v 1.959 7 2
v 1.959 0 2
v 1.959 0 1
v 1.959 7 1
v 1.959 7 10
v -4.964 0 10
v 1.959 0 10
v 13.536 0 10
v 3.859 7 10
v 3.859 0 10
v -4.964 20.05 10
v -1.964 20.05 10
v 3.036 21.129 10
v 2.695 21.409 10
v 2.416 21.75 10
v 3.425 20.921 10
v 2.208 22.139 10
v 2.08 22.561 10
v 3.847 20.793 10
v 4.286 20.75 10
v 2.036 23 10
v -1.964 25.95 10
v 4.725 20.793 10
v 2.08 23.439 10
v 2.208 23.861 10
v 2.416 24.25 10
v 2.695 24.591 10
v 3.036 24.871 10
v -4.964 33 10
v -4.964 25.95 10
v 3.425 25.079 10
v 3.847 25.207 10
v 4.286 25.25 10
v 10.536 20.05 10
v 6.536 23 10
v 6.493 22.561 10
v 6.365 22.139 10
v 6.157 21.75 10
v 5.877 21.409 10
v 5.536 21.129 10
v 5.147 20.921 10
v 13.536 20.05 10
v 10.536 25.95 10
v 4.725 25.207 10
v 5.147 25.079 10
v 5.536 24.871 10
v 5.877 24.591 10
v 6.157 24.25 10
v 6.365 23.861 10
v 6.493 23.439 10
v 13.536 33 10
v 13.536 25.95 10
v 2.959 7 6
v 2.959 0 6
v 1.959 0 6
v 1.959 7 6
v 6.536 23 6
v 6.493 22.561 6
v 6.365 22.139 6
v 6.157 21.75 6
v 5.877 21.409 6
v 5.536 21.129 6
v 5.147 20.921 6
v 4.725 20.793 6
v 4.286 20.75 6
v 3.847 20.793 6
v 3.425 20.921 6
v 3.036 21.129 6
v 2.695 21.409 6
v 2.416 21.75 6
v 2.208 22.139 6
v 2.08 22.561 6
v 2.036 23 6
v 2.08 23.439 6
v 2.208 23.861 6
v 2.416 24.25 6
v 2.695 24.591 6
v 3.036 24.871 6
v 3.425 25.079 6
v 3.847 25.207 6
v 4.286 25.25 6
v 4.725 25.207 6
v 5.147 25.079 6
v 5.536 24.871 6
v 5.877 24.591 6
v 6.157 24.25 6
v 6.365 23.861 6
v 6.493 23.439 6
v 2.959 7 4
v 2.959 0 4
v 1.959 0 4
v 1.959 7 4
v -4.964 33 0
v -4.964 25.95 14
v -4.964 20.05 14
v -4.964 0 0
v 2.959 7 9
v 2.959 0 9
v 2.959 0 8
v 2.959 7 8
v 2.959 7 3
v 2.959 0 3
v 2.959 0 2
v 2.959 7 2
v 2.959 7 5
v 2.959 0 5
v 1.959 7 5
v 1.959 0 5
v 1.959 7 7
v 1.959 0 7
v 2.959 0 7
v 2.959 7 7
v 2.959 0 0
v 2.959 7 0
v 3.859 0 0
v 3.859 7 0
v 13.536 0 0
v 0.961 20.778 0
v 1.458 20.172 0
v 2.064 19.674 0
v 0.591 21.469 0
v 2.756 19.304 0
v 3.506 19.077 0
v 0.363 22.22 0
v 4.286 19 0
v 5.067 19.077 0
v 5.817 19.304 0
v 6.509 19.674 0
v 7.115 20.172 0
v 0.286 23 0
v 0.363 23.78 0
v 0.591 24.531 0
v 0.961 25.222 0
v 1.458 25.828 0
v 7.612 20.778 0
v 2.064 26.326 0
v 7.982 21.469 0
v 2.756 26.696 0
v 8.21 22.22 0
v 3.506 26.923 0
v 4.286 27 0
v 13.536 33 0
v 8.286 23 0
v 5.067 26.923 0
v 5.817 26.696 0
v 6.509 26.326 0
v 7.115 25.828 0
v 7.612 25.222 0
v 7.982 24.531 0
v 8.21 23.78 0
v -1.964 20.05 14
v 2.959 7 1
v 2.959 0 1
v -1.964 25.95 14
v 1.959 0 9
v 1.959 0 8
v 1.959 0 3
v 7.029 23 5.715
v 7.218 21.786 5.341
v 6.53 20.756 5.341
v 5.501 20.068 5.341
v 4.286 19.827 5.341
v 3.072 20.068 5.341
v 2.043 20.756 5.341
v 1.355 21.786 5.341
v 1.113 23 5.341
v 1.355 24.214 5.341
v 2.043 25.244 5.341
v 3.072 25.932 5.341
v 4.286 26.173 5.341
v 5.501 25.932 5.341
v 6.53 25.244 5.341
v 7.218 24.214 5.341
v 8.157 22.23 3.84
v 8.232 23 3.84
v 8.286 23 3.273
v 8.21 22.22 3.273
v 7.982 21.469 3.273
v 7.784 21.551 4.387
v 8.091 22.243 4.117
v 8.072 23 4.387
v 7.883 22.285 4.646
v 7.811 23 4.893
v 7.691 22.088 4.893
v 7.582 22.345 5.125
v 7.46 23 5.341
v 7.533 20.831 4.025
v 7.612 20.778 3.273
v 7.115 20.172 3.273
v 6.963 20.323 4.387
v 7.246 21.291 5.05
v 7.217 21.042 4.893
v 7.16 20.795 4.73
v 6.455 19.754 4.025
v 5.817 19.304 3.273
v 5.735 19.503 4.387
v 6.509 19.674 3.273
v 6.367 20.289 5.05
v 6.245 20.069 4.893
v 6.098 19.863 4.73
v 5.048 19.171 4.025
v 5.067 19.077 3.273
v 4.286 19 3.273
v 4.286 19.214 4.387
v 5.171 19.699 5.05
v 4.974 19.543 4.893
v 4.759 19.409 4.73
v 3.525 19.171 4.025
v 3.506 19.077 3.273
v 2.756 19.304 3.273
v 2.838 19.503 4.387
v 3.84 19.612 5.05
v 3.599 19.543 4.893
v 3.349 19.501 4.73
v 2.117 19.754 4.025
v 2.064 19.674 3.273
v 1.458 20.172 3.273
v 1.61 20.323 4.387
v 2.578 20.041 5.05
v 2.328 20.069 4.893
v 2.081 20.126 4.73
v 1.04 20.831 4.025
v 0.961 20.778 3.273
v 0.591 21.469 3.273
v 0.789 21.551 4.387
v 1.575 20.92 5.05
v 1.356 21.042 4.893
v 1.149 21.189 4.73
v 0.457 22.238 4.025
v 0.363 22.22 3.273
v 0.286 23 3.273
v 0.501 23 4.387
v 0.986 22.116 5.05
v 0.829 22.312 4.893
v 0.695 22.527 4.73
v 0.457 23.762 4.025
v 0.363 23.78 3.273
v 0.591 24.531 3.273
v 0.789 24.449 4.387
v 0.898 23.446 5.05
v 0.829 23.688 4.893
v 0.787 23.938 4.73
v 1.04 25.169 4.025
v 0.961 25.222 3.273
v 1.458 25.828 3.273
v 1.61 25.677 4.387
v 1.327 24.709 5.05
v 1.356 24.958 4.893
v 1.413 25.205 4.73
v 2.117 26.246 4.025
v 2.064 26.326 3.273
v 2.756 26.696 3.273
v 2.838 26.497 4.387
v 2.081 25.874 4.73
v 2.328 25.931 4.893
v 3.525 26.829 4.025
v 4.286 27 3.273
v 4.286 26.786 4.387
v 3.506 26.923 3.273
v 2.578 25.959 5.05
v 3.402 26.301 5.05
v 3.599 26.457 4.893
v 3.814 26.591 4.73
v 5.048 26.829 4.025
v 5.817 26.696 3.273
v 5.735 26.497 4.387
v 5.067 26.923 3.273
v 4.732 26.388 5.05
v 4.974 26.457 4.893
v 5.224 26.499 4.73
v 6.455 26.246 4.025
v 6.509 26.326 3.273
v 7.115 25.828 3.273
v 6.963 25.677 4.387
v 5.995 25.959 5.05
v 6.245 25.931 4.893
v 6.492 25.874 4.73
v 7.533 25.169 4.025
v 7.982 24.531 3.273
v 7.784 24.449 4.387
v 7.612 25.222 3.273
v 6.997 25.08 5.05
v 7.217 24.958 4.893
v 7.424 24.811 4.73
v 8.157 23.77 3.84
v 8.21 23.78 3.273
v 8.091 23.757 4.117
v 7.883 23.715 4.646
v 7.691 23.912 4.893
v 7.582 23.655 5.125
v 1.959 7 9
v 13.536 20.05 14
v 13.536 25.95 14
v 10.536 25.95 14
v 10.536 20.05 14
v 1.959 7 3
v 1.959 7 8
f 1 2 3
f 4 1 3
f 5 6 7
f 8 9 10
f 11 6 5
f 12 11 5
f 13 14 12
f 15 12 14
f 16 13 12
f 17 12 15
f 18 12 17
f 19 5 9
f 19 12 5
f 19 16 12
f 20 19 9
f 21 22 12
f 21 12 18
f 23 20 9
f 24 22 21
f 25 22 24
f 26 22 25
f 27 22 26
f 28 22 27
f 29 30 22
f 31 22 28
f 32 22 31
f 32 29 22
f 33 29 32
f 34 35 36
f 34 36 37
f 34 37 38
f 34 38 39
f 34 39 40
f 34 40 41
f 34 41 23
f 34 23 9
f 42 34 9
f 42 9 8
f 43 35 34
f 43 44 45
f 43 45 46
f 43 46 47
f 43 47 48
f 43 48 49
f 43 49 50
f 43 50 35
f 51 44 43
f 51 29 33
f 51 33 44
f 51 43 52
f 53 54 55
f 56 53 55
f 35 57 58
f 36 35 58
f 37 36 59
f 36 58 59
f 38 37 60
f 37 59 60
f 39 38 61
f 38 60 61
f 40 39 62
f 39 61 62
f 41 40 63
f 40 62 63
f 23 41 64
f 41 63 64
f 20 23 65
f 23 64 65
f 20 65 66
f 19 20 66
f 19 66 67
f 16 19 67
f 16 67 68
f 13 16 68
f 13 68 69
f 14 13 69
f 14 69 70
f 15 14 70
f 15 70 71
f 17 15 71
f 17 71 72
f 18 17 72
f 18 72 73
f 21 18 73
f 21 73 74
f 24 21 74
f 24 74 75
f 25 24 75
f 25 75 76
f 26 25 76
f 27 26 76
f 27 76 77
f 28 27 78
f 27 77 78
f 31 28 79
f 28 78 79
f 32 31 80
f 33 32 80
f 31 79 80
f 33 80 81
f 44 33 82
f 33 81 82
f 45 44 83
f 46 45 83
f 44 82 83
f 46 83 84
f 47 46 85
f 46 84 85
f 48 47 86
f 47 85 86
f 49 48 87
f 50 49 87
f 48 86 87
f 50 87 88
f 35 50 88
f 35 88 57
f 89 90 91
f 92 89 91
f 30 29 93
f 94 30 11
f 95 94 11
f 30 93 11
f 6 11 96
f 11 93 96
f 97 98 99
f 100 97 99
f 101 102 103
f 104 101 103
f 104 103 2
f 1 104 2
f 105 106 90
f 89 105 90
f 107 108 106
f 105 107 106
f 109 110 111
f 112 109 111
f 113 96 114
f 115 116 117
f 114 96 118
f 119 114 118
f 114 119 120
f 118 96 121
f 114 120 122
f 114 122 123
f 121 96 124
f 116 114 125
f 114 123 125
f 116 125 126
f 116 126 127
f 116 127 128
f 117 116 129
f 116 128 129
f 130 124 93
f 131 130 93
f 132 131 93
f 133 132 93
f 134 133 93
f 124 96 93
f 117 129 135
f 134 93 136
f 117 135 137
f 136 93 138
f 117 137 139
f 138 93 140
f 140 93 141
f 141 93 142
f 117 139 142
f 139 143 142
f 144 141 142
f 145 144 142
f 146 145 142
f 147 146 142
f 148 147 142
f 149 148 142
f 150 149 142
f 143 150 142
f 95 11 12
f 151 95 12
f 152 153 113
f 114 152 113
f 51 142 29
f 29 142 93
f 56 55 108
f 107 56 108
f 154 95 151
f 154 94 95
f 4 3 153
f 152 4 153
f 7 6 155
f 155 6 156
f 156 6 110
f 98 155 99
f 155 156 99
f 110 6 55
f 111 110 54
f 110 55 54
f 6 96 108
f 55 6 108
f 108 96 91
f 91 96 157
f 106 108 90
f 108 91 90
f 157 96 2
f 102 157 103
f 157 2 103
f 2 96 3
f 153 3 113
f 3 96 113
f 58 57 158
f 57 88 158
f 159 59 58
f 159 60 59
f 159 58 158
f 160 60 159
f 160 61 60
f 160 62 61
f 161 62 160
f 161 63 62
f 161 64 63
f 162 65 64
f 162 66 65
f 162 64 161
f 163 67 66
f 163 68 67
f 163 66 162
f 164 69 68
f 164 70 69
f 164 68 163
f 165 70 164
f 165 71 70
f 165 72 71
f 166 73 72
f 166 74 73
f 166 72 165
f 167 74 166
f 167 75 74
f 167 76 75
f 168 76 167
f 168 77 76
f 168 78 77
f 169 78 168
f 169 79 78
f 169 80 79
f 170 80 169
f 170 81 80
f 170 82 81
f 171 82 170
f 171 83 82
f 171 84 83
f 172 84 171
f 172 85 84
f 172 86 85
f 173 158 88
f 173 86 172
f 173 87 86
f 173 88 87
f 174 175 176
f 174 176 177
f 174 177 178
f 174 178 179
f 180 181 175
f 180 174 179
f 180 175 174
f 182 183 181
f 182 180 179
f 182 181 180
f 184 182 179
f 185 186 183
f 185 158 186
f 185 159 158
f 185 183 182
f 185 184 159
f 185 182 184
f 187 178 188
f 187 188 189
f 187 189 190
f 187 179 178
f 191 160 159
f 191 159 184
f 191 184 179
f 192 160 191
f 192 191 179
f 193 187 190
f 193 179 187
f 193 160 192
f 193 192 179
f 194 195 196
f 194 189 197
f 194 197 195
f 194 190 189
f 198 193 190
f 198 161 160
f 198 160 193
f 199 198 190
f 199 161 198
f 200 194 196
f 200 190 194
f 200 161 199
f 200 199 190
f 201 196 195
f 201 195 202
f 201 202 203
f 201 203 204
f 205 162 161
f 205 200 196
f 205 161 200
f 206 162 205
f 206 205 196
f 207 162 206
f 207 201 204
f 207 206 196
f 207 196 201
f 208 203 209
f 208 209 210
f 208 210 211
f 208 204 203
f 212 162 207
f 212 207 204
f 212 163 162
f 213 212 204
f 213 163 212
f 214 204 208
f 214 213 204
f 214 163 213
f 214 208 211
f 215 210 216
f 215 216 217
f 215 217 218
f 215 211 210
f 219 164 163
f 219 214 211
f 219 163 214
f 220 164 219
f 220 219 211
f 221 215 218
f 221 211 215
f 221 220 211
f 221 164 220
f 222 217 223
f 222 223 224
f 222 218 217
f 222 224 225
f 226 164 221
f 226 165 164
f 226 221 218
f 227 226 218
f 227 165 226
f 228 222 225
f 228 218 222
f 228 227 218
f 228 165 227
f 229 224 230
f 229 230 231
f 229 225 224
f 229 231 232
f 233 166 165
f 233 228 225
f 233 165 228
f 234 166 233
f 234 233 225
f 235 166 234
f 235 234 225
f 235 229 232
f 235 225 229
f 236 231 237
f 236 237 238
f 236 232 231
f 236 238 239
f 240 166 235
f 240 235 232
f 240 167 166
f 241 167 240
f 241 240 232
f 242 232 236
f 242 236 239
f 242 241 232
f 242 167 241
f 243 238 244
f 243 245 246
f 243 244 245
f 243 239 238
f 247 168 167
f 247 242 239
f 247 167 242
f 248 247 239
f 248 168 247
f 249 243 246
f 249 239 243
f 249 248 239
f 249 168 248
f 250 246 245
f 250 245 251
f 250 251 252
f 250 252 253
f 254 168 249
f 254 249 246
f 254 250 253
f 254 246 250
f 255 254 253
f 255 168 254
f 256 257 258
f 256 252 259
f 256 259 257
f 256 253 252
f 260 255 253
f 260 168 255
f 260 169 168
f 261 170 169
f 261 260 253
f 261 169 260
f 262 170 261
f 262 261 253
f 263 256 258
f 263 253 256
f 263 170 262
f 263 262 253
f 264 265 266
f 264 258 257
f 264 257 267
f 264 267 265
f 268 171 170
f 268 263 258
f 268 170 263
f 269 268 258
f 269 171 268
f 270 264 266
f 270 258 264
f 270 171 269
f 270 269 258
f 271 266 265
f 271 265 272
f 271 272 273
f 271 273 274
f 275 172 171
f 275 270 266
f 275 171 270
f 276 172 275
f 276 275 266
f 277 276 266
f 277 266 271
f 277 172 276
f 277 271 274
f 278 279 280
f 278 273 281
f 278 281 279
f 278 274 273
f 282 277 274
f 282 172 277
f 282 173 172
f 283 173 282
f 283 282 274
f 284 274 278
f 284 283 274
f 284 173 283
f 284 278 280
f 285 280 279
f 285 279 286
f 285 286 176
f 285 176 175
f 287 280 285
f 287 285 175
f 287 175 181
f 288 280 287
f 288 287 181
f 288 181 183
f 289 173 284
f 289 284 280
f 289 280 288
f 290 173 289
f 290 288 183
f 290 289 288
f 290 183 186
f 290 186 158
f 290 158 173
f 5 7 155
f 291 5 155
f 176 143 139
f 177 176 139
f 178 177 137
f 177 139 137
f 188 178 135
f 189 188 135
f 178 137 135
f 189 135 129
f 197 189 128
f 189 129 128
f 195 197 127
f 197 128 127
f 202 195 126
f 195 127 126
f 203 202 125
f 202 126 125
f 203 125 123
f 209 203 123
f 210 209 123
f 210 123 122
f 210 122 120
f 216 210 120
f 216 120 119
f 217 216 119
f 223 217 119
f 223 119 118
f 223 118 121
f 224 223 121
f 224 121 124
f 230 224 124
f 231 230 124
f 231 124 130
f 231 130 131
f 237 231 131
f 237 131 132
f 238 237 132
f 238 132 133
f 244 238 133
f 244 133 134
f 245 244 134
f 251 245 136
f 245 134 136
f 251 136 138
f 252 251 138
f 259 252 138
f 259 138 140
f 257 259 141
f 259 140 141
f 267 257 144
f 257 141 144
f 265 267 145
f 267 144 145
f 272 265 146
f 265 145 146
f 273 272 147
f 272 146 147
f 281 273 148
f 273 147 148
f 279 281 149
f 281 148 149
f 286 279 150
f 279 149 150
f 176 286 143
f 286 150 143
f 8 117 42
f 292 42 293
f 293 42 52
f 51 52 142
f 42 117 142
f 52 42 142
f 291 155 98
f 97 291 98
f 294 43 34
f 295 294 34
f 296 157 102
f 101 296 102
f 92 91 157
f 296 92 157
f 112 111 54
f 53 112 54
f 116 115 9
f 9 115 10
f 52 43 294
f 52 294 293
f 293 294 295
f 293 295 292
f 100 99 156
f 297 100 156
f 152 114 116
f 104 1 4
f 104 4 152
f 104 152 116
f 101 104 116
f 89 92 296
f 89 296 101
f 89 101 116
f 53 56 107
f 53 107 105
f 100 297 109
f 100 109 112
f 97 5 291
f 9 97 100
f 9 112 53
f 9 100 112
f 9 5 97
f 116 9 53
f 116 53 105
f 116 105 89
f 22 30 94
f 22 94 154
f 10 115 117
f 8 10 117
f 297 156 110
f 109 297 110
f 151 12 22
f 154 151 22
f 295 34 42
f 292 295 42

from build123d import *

# Parameters (mm, degrees)
F0_W     = 18.5
F0_H     = 13
F1_DEPTH = 10
F0_W_2   = 3
F0_H_2   = 2.95
F2_DEPTH = 14
F4_DEPTH = 7
F5_R     = 4
F5_R_2   = 2.25
F6_DEPTH = 6


# Not quite as in the source:
# - a fillet or chamfer that OpenCascade refuses, or shapes differently, is made with other operations: its cross-section is extruded or revolved along the edge and cut away or added


with BuildPart() as f1:
    # F0 (on Top) → F1 (new body)
    with BuildSketch(Plane.XY):
        with BuildLine():
            Line((-4.96357069, 33), (-4.96357069, 25.95))
            Line((-4.96357069, 25.95), (-1.96357069, 25.95))
            Line((-1.96357069, 25.95), (-1.96357069, 23))
            Line((-1.96357069, 23), (2.03642931, 23))
            ThreePointArc((2.03642931, 23), (4.28642931, 25.25), (6.53642931, 23))
            Line((6.53642931, 23), (10.53642931, 23))
            Line((10.53642931, 23), (10.53642931, 25.95))
            Line((10.53642931, 25.95), (13.53642931, 25.95))
            Line((13.53642931, 25.95), (13.53642931, 33))
            Line((13.53642931, 33), (-4.96357069, 33))
        make_face()
        with BuildLine():
            Line((-4.96357069, 20.05), (-4.96357069, 13))
            Line((-4.96357069, 13), (13.53642931, 13))
            Line((13.53642931, 13), (13.53642931, 20.05))
            Line((13.53642931, 20.05), (10.53642931, 20.05))
            Line((10.53642931, 20.05), (10.53642931, 23))
            Line((10.53642931, 23), (6.53642931, 23))
            ThreePointArc((6.53642931, 23), (4.28642931, 20.75), (2.03642931, 23))
            Line((2.03642931, 23), (-1.96357069, 23))
            Line((-1.96357069, 23), (-1.96357069, 20.05))
            Line((-1.96357069, 20.05), (-4.96357069, 20.05))
        make_face()
        with Locations((4.28642931, 6.5)):
            Rectangle(F0_W, F0_H)
    extrude(amount=F1_DEPTH)

    # F0 (on Top) → F2 (join)
    with BuildSketch(Plane.XY):
        with Locations((-3.46357069, 21.525)):
            Rectangle(F0_W_2, F0_H_2)
        with Locations((-3.46357069, 24.475)):
            Rectangle(F0_W_2, F0_H_2)
        with Locations((12.03642931, 24.475)):
            Rectangle(F0_W_2, F0_H_2)
        with Locations((12.03642931, 21.525)):
            Rectangle(F0_W_2, F0_H_2)
    extrude(amount=F2_DEPTH)

    # F3 (on face) → F4 (cut)
    with BuildSketch(Plane.XZ):
        Polygon((3.8593590405, 10), (1.9593590405, 10), (1.9593590405, 9), (2.9593590405, 9), (2.9593590405, 8), (1.9593590405, 8), (1.9593590405, 7), (2.9593590405, 7), (2.9593590405, 6), (1.9593590405, 6), (1.9593590405, 5), (2.9593590405, 5), (2.9593590405, 4), (1.9593590405, 4), (1.9593590405, 3), (2.9593590405, 3), (2.9593590405, 2), (1.9593590405, 2), (1.9593590405, 1), (2.9593590405, 1), (2.9593590405, 0), (3.8593590405, 0), align=None)
    extrude(amount=-F4_DEPTH, mode=Mode.SUBTRACT)

    # F5 (on face) → F6 (cut)
    with BuildSketch(Plane(origin=(0, 0, 0), x_dir=(1, 0, 0), z_dir=(0, 0, -1))):
        with Locations((4.28642931, -23)):
            Circle(F5_R)
        with Locations((4.28642931, -23)):
            Circle(F5_R_2, mode=Mode.SUBTRACT)
    extrude(amount=-F6_DEPTH, mode=Mode.SUBTRACT)

    # F7: fillet of radius 3 on 1 edges, made by hand

    # F7_s1 → F7_t2 (revolve)
    with BuildSketch(Plane.XZ.offset(-23)):
        with BuildLine():
            ThreePointArc((8.28642931, 3.2728219713), (7.8113055446, 4.8930071459), (6.53642931, 6))
            Line((6.53642931, 6), (8.28642931, 6))
            Line((8.28642931, 6), (8.28642931, 3.2728219713))
        make_face()
    revolve(axis=Axis((4.28642931, 23, 6), (0, 0, -1)))


solid = f1.part
